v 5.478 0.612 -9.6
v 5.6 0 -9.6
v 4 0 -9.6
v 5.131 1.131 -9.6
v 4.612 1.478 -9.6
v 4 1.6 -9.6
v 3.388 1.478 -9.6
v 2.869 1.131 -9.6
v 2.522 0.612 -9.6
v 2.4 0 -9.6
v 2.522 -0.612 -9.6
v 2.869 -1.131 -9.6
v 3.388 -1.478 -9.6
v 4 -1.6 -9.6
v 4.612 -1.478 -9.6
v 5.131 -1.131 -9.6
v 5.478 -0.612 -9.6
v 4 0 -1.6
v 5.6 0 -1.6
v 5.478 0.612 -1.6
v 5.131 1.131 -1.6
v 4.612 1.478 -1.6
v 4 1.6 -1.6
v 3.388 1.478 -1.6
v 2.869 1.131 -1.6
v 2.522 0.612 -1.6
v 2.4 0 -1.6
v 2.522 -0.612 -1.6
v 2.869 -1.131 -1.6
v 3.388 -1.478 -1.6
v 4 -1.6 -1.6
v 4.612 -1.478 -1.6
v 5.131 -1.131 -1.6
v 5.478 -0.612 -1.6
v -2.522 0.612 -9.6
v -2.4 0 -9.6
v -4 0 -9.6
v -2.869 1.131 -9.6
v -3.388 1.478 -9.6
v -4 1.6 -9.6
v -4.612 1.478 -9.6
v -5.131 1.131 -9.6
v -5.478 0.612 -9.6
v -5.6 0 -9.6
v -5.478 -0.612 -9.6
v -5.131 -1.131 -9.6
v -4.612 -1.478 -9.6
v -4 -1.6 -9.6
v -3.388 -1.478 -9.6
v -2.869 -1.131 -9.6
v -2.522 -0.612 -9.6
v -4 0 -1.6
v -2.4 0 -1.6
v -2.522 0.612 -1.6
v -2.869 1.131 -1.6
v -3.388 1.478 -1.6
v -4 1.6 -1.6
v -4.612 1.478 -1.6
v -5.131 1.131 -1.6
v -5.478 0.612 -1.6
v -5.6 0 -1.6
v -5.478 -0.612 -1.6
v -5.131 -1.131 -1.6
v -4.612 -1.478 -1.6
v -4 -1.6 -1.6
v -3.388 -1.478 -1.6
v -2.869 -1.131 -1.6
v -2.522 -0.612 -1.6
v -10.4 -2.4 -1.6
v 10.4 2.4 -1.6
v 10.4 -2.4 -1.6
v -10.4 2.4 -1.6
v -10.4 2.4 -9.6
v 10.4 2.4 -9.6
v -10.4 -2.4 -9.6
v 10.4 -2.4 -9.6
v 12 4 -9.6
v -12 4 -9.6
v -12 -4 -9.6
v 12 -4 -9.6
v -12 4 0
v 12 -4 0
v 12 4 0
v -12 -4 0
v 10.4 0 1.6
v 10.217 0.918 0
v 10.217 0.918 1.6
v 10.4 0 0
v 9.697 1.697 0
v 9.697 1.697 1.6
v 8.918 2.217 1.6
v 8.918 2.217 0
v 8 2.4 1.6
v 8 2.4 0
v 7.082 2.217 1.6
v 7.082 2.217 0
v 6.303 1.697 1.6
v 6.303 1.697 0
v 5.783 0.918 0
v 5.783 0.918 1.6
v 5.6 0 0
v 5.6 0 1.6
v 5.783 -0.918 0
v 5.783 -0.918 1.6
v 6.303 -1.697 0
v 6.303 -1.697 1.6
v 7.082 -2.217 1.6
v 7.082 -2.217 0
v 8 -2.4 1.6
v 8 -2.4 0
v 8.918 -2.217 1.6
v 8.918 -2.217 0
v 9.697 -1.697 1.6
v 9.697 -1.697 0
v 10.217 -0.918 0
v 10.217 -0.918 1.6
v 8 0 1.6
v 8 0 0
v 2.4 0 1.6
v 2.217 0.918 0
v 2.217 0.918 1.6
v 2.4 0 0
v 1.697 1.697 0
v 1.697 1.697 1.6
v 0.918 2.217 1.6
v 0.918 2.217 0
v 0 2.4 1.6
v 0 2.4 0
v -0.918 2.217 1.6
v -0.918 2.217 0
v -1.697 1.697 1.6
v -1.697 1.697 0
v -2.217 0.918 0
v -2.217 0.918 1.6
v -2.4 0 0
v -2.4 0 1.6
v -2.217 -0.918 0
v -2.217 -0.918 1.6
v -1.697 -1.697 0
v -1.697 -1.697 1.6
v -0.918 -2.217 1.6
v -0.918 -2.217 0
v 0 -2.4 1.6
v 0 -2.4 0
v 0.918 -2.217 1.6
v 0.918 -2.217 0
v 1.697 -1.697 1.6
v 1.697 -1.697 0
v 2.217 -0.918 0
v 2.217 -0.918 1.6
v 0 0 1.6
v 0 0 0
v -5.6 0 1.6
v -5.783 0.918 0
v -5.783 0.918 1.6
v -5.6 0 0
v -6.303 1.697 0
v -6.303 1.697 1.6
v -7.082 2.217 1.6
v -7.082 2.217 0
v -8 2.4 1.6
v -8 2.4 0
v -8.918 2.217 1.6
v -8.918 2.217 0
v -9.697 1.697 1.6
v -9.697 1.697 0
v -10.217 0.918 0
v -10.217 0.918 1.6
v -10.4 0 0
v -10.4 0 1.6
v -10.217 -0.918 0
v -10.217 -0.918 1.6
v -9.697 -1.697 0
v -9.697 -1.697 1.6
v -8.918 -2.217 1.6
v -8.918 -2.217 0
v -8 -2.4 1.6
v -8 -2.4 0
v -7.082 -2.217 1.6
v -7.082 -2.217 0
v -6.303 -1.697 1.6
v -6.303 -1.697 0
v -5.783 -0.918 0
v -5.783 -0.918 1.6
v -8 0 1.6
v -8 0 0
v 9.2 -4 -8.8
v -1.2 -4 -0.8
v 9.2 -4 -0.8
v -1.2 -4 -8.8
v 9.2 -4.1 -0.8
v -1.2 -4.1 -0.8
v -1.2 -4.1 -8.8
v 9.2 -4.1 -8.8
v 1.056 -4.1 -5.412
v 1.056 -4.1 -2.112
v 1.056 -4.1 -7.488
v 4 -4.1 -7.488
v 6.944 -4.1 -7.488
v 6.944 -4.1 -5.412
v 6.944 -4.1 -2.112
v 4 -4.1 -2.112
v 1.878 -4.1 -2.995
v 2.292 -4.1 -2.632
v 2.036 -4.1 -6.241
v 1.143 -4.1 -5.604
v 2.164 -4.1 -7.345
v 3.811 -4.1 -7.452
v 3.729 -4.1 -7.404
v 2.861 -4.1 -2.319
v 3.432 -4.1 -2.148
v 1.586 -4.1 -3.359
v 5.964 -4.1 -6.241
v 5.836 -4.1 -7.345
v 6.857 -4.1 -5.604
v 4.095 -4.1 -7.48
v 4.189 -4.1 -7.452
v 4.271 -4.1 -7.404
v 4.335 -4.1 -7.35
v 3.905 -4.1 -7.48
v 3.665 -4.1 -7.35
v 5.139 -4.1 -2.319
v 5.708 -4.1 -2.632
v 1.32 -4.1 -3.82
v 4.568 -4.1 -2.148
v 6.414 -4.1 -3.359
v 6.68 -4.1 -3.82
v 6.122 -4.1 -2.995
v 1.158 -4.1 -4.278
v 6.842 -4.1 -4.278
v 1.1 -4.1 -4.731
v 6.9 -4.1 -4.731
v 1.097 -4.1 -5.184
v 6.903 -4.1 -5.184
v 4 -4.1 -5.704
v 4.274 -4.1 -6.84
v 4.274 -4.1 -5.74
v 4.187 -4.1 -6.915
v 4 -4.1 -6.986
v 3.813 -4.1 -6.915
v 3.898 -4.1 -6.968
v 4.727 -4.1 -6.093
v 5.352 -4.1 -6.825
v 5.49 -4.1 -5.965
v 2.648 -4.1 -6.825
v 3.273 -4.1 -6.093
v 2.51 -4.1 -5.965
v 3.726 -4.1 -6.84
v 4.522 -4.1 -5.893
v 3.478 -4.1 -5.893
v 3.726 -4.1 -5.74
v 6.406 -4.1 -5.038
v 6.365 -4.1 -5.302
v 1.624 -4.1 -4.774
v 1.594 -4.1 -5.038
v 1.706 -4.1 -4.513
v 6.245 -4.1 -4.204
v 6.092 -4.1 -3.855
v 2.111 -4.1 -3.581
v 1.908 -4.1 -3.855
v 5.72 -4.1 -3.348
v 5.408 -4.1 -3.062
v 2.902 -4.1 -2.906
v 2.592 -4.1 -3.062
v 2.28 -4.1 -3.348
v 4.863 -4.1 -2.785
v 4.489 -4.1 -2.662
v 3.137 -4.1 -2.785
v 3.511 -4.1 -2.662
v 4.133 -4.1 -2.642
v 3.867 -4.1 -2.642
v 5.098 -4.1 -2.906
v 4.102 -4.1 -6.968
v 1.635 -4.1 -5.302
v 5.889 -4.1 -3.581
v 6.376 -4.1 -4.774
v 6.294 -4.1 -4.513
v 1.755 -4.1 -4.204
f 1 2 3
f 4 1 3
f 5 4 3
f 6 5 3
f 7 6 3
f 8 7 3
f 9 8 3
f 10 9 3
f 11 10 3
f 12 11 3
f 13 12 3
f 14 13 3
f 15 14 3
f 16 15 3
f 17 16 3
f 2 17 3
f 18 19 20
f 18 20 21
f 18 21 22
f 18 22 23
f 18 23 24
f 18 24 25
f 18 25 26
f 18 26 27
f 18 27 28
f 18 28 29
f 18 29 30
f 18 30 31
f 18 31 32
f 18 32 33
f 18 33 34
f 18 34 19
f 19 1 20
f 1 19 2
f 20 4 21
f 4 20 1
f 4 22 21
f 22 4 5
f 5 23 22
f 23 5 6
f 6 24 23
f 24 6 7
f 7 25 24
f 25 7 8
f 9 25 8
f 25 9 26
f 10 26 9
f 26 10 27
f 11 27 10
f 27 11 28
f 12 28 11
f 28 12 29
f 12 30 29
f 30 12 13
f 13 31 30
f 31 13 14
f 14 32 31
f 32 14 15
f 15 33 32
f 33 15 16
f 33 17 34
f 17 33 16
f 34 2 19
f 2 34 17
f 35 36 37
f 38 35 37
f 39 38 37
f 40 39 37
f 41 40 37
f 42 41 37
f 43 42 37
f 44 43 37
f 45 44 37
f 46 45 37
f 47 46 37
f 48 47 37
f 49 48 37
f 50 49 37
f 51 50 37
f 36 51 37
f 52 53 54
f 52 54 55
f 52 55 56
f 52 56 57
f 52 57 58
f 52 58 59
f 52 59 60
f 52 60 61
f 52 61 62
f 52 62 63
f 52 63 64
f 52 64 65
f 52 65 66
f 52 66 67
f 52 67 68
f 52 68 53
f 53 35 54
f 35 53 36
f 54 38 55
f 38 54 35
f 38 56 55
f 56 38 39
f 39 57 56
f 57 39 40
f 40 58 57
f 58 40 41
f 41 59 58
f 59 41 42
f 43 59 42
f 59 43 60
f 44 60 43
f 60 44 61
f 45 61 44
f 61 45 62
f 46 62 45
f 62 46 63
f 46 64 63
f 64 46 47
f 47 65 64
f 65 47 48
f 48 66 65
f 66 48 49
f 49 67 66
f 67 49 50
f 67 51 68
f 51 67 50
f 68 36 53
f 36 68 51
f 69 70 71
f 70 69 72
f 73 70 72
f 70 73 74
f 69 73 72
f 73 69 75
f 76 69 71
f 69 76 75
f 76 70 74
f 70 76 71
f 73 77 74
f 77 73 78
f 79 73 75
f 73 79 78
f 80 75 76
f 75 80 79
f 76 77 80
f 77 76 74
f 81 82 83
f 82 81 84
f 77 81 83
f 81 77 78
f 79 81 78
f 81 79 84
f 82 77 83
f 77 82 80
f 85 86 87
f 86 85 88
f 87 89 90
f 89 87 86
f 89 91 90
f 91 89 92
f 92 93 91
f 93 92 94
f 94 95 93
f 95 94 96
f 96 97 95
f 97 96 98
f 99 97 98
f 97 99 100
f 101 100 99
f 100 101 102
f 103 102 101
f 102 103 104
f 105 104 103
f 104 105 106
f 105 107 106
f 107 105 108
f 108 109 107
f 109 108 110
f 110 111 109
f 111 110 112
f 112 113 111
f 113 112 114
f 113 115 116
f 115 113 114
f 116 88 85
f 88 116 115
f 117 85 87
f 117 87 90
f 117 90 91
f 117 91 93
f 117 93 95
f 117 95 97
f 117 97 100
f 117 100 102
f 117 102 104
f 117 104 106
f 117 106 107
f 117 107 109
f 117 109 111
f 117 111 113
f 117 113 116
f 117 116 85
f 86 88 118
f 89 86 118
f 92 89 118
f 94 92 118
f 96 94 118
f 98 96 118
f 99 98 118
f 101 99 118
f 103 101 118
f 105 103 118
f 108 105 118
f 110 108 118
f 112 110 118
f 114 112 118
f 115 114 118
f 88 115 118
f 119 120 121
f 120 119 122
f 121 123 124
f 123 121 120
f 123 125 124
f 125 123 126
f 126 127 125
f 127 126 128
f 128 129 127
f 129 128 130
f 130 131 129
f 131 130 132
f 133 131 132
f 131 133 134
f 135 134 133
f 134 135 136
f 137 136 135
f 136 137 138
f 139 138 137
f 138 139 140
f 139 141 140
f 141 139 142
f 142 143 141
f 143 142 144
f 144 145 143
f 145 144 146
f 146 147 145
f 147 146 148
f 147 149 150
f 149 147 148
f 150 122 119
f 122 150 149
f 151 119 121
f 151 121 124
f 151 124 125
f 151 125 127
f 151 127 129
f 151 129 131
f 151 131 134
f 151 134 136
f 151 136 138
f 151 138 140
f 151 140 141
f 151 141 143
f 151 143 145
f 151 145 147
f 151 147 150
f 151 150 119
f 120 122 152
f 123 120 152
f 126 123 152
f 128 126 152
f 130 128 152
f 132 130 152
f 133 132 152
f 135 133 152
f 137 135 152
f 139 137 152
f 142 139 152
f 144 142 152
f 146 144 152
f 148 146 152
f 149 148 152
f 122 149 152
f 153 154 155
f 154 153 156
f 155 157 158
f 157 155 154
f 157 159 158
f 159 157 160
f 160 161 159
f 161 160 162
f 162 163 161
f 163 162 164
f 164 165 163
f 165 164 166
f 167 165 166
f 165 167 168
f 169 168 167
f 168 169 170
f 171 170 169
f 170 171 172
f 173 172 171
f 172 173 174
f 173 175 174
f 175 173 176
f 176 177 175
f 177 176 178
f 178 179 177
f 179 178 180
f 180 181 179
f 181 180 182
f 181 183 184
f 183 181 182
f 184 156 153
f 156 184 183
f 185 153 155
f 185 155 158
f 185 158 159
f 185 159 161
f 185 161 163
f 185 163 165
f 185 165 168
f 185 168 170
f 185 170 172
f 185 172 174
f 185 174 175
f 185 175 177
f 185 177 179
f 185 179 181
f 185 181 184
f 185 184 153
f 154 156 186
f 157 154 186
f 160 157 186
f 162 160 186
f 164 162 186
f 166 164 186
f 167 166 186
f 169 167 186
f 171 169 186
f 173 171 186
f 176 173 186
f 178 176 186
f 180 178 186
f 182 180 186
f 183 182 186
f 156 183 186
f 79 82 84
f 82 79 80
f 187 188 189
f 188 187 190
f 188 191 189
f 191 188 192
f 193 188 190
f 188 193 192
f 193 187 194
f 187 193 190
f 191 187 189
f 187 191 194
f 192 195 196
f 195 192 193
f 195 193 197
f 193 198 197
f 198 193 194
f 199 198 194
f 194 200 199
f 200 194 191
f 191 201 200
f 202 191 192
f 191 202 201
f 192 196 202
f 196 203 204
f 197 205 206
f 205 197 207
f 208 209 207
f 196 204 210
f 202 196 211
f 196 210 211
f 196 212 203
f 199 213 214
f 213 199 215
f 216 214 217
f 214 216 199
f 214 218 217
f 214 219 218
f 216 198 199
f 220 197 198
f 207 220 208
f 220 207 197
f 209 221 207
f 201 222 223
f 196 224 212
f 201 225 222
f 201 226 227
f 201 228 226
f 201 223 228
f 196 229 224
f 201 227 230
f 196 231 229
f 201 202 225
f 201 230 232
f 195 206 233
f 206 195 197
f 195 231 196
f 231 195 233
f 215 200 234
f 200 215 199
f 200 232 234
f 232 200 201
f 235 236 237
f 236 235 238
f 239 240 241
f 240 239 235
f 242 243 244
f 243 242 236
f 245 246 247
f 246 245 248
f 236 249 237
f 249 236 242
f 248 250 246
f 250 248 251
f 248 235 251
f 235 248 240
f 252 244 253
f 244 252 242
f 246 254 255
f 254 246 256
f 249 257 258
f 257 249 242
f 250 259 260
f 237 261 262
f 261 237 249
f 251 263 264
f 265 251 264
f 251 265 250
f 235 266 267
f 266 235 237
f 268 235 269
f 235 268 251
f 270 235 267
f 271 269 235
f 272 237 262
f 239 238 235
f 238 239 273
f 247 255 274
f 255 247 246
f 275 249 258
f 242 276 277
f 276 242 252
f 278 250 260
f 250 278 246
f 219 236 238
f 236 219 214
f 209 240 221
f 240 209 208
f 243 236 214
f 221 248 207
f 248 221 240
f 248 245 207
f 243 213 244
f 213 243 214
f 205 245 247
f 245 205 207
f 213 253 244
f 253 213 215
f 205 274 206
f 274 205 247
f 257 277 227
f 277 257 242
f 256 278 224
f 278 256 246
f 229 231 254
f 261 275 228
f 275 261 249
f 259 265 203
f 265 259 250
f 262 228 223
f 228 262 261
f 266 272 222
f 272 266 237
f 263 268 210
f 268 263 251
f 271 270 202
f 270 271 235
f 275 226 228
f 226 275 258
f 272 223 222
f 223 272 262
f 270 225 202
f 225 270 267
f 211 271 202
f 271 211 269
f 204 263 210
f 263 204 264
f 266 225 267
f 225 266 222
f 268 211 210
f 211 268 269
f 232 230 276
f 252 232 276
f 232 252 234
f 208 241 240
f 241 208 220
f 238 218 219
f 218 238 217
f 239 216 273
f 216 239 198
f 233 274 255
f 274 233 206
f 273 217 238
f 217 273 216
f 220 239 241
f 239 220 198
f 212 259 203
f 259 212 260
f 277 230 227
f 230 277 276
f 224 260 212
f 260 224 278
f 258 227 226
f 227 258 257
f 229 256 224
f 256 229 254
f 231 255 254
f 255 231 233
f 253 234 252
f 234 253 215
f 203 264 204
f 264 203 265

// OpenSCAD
// file: ../p/4-4edge.scad
use <../lib.scad>
function ldraw_lib__4_4edge() = [
// 0 Circle 1.0
// 0 Name: 4-4edge.dat
// 0 Author: James Jessiman
// 0 !LDRAW_ORG Primitive UPDATE 2017-01
// 0 !LICENSE Licensed under CC BY 2.0 and CC BY 4.0 : see CAreadme.txt
// 
// 0 BFC CERTIFY CCW
  [0,"BFC","CERTIFY"],
  [0,"BFC","CCW"],
// 
// 0 !HISTORY 1998-12-15 [PTadmin] Official Update 1998-10
// 0 !HISTORY 2005-12-28 [PTadmin] Official Update 2005-01
// 0 !HISTORY 2007-06-24 [PTadmin] Header formatted for Contributor Agreement
// 0 !HISTORY 2008-07-01 [PTadmin] Official Update 2008-01
// 0 !HISTORY 2017-01-15 [Steffen] BFCed
// 0 !HISTORY 2017-12-30 [PTadmin] Official Update 2017-01
// 
// 
// 2 24 1 0 0 0.9239 0 0.3827
  [2,24,1,0,0,0.9239,0,0.3827],
// 2 24 0.9239 0 0.3827 0.7071 0 0.7071
  [2,24,0.9239,0,0.3827,0.7071,0,0.7071],
// 2 24 0.7071 0 0.7071 0.3827 0 0.9239
  [2,24,0.7071,0,0.7071,0.3827,0,0.9239],
// 2 24 0.3827 0 0.9239 0 0 1
  [2,24,0.3827,0,0.9239,0,0,1],
// 2 24 0 0 1 -0.3827 0 0.9239
  [2,24,0,0,1,-0.3827,0,0.9239],
// 2 24 -0.3827 0 0.9239 -0.7071 0 0.7071
  [2,24,-0.3827,0,0.9239,-0.7071,0,0.7071],
// 2 24 -0.7071 0 0.7071 -0.9239 0 0.3827
  [2,24,-0.7071,0,0.7071,-0.9239,0,0.3827],
// 2 24 -0.9239 0 0.3827 -1 0 -0
  [2,24,-0.9239,0,0.3827,-1,0,-0],
// 2 24 -1 0 -0 -0.9239 0 -0.3827
  [2,24,-1,0,-0,-0.9239,0,-0.3827],
// 2 24 -0.9239 0 -0.3827 -0.7071 0 -0.7071
  [2,24,-0.9239,0,-0.3827,-0.7071,0,-0.7071],
// 2 24 -0.7071 0 -0.7071 -0.3827 0 -0.9239
  [2,24,-0.7071,0,-0.7071,-0.3827,0,-0.9239],
// 2 24 -0.3827 0 -0.9239 0 0 -1
  [2,24,-0.3827,0,-0.9239,0,0,-1],
// 2 24 0 0 -1 0.3827 0 -0.9239
  [2,24,0,0,-1,0.3827,0,-0.9239],
// 2 24 0.3827 0 -0.9239 0.7071 0 -0.7071
  [2,24,0.3827,0,-0.9239,0.7071,0,-0.7071],
// 2 24 0.7071 0 -0.7071 0.9239 0 -0.3827
  [2,24,0.7071,0,-0.7071,0.9239,0,-0.3827],
// 2 24 0.9239 0 -0.3827 1 0 0
  [2,24,0.9239,0,-0.3827,1,0,0],
];
module ldraw_lib__4_4edge(step=0, col=false, unit=2/5, alt=false, line=0.2, solid=!$preview)
    makepoly(ldraw_lib__4_4edge(), step=step, col=col, unit=unit, alt=alt, line=line, solid=solid);
ldraw_lib__4_4edge(line=0.2);
// file: ../p/4-4disc.scad
use <../lib.scad>
function ldraw_lib__4_4disc() = [
// 0 Disc 1.0
// 0 Name: 4-4disc.dat
// 0 Author: James Jessiman
// 0 !LDRAW_ORG Primitive UPDATE 2002-02
// 0 !LICENSE Licensed under CC BY 2.0 and CC BY 4.0 : see CAreadme.txt
// 
// 0 BFC CERTIFY CCW
  [0,"BFC","CERTIFY"],
  [0,"BFC","CCW"],
// 
// 0 !HISTORY 1998-12-15 [PTadmin] Official Update 1998-10
// 0 !HISTORY 2002-03-23 [sbliss] Added BFC statement
// 0 !HISTORY 2002-04-25 [PTadmin] Official Update 2002-02
// 0 !HISTORY 2007-06-24 [PTadmin] Header formatted for Contributor Agreement
// 0 !HISTORY 2008-07-01 [PTadmin] Official Update 2008-01
// 
// 
// 3 16 0 0 0 1 0 0 0.9239 0 0.3827
  [3,16,0,0,0,1,0,0,0.9239,0,0.3827],
// 3 16 0 0 0 0.9239 0 0.3827 0.7071 0 0.7071
  [3,16,0,0,0,0.9239,0,0.3827,0.7071,0,0.7071],
// 3 16 0 0 0 0.7071 0 0.7071 0.3827 0 0.9239
  [3,16,0,0,0,0.7071,0,0.7071,0.3827,0,0.9239],
// 3 16 0 0 0 0.3827 0 0.9239 0 0 1
  [3,16,0,0,0,0.3827,0,0.9239,0,0,1],
// 3 16 0 0 0 0 0 1 -0.3827 0 0.9239
  [3,16,0,0,0,0,0,1,-0.3827,0,0.9239],
// 3 16 0 0 0 -0.3827 0 0.9239 -0.7071 0 0.7071
  [3,16,0,0,0,-0.3827,0,0.9239,-0.7071,0,0.7071],
// 3 16 0 0 0 -0.7071 0 0.7071 -0.9239 0 0.3827
  [3,16,0,0,0,-0.7071,0,0.7071,-0.9239,0,0.3827],
// 3 16 0 0 0 -0.9239 0 0.3827 -1 0 -0
  [3,16,0,0,0,-0.9239,0,0.3827,-1,0,-0],
// 3 16 0 0 0 -1 0 -0 -0.9239 0 -0.3827
  [3,16,0,0,0,-1,0,-0,-0.9239,0,-0.3827],
// 3 16 0 0 0 -0.9239 0 -0.3827 -0.7071 0 -0.7071
  [3,16,0,0,0,-0.9239,0,-0.3827,-0.7071,0,-0.7071],
// 3 16 0 0 0 -0.7071 0 -0.7071 -0.3827 0 -0.9239
  [3,16,0,0,0,-0.7071,0,-0.7071,-0.3827,0,-0.9239],
// 3 16 0 0 0 -0.3827 0 -0.9239 0 0 -1
  [3,16,0,0,0,-0.3827,0,-0.9239,0,0,-1],
// 3 16 0 0 0 0 0 -1 0.3827 0 -0.9239
  [3,16,0,0,0,0,0,-1,0.3827,0,-0.9239],
// 3 16 0 0 0 0.3827 0 -0.9239 0.7071 0 -0.7071
  [3,16,0,0,0,0.3827,0,-0.9239,0.7071,0,-0.7071],
// 3 16 0 0 0 0.7071 0 -0.7071 0.9239 0 -0.3827
  [3,16,0,0,0,0.7071,0,-0.7071,0.9239,0,-0.3827],
// 3 16 0 0 0 0.9239 0 -0.3827 1 0 0
  [3,16,0,0,0,0.9239,0,-0.3827,1,0,0],
// 0
];
module ldraw_lib__4_4disc(step=0, col=false, unit=2/5, alt=false, line=0.2, solid=!$preview)
    makepoly(ldraw_lib__4_4disc(), step=step, col=col, unit=unit, alt=alt, line=line, solid=solid);
ldraw_lib__4_4disc(line=0.2);
// file: ../p/4-4cyli.scad
use <../lib.scad>
$fa=1; $fs=0.2;
function ldraw_lib__4_4cyli(realsolid=false) = [
// 0 Cylinder 1.0
// 0 Name: 4-4cyli.dat
// 0 Author: James Jessiman
// 0 !LDRAW_ORG Primitive UPDATE 2005-01
// 0 !LICENSE Licensed under CC BY 2.0 and CC BY 4.0 : see CAreadme.txt
// 
// 0 BFC CERTIFY CCW
  [0,"BFC","CERTIFY"],
  [0,"BFC","CCW"],
// 
// 0 !HISTORY 1998-12-15 [PTadmin] Official Update 1998-10
// 0 !HISTORY 2002-03-23 [sbliss] Added BFC statement; merged headers from files in distributions LDraw 0.27 and Complete.
// 0 !HISTORY 2002-04-25 [PTadmin] Official Update 2002-02
// 0 !HISTORY 2004-12-14 [guyvivan] BFC CCW
// 0 !HISTORY 2005-12-28 [PTadmin] Official Update 2005-01
// 0 !HISTORY 2007-06-24 [PTadmin] Header formatted for Contributor Agreement
// 0 !HISTORY 2008-07-01 [PTadmin] Official Update 2008-01
// 
// 
// 4 16 1 1 0 0.9239 1 0.3827 0.9239 0 0.3827 1 0 0
  [4,16,1,1,0,0.9239,1,0.3827,0.9239,0,0.3827,1,0,0],
// 5 24 1 0 0 1 1 0 0.9239 0 0.3827 0.9239 0 -0.3827
  [5,24,1,0,0,1,1,0,0.9239,0,0.3827,0.9239,0,-0.3827],
// 4 16 0.9239 1 0.3827 0.7071 1 0.7071 0.7071 0 0.7071 0.9239 0 0.3827
  [4,16,0.9239,1,0.3827,0.7071,1,0.7071,0.7071,0,0.7071,0.9239,0,0.3827],
// 5 24 0.9239 0 0.3827 0.9239 1 0.3827 0.7071 0 0.7071 1 0 0
  [5,24,0.9239,0,0.3827,0.9239,1,0.3827,0.7071,0,0.7071,1,0,0],
// 4 16 0.7071 1 0.7071 0.3827 1 0.9239 0.3827 0 0.9239 0.7071 0 0.7071
  [4,16,0.7071,1,0.7071,0.3827,1,0.9239,0.3827,0,0.9239,0.7071,0,0.7071],
// 5 24 0.7071 0 0.7071 0.7071 1 0.7071 0.3827 0 0.9239 0.9239 0 0.3827
  [5,24,0.7071,0,0.7071,0.7071,1,0.7071,0.3827,0,0.9239,0.9239,0,0.3827],
// 4 16 0.3827 1 0.9239 0 1 1 0 0 1 0.3827 0 0.9239
  [4,16,0.3827,1,0.9239,0,1,1,0,0,1,0.3827,0,0.9239],
// 5 24 0.3827 0 0.9239 0.3827 1 0.9239 0 0 1 0.7071 0 0.7071
  [5,24,0.3827,0,0.9239,0.3827,1,0.9239,0,0,1,0.7071,0,0.7071],
// 4 16 0 1 1 -0.3827 1 0.9239 -0.3827 0 0.9239 0 0 1
  [4,16,0,1,1,-0.3827,1,0.9239,-0.3827,0,0.9239,0,0,1],
// 5 24 0 0 1 0 1 1 -0.3827 0 0.9239 0.3827 0 0.9239
  [5,24,0,0,1,0,1,1,-0.3827,0,0.9239,0.3827,0,0.9239],
// 4 16 -0.3827 1 0.9239 -0.7071 1 0.7071 -0.7071 0 0.7071 -0.3827 0 0.9239
  [4,16,-0.3827,1,0.9239,-0.7071,1,0.7071,-0.7071,0,0.7071,-0.3827,0,0.9239],
// 5 24 -0.3827 0 0.9239 -0.3827 1 0.9239 -0.7071 0 0.7071 0 0 1
  [5,24,-0.3827,0,0.9239,-0.3827,1,0.9239,-0.7071,0,0.7071,0,0,1],
// 4 16 -0.7071 1 0.7071 -0.9239 1 0.3827 -0.9239 0 0.3827 -0.7071 0 0.7071
  [4,16,-0.7071,1,0.7071,-0.9239,1,0.3827,-0.9239,0,0.3827,-0.7071,0,0.7071],
// 5 24 -0.7071 0 0.7071 -0.7071 1 0.7071 -0.9239 0 0.3827 -0.3827 0 0.9239
  [5,24,-0.7071,0,0.7071,-0.7071,1,0.7071,-0.9239,0,0.3827,-0.3827,0,0.9239],
// 4 16 -0.9239 1 0.3827 -1 1 0 -1 0 0 -0.9239 0 0.3827
  [4,16,-0.9239,1,0.3827,-1,1,0,-1,0,0,-0.9239,0,0.3827],
// 5 24 -0.9239 0 0.3827 -0.9239 1 0.3827 -1 0 0 -0.7071 0 0.7071
  [5,24,-0.9239,0,0.3827,-0.9239,1,0.3827,-1,0,0,-0.7071,0,0.7071],
// 4 16 -1 1 0 -0.9239 1 -0.3827 -0.9239 0 -0.3827 -1 0 0
  [4,16,-1,1,0,-0.9239,1,-0.3827,-0.9239,0,-0.3827,-1,0,0],
// 5 24 -1 0 0 -1 1 0 -0.9239 0 -0.3827 -0.9239 0 0.3827
  [5,24,-1,0,0,-1,1,0,-0.9239,0,-0.3827,-0.9239,0,0.3827],
// 4 16 -0.9239 1 -0.3827 -0.7071 1 -0.7071 -0.7071 0 -0.7071 -0.9239 0 -0.3827
  [4,16,-0.9239,1,-0.3827,-0.7071,1,-0.7071,-0.7071,0,-0.7071,-0.9239,0,-0.3827],
// 5 24 -0.9239 0 -0.3827 -0.9239 1 -0.3827 -0.7071 0 -0.7071 -1 0 0
  [5,24,-0.9239,0,-0.3827,-0.9239,1,-0.3827,-0.7071,0,-0.7071,-1,0,0],
// 4 16 -0.7071 1 -0.7071 -0.3827 1 -0.9239 -0.3827 0 -0.9239 -0.7071 0 -0.7071
  [4,16,-0.7071,1,-0.7071,-0.3827,1,-0.9239,-0.3827,0,-0.9239,-0.7071,0,-0.7071],
// 5 24 -0.7071 0 -0.7071 -0.7071 1 -0.7071 -0.3827 0 -0.9239 -0.9239 0 -0.3827
  [5,24,-0.7071,0,-0.7071,-0.7071,1,-0.7071,-0.3827,0,-0.9239,-0.9239,0,-0.3827],
// 4 16 -0.3827 1 -0.9239 0 1 -1 0 0 -1 -0.3827 0 -0.9239
  [4,16,-0.3827,1,-0.9239,0,1,-1,0,0,-1,-0.3827,0,-0.9239],
// 5 24 -0.3827 0 -0.9239 -0.3827 1 -0.9239 0 0 -1 -0.7071 0 -0.7071
  [5,24,-0.3827,0,-0.9239,-0.3827,1,-0.9239,0,0,-1,-0.7071,0,-0.7071],
// 4 16 0 1 -1 0.3827 1 -0.9239 0.3827 0 -0.9239 0 0 -1
  [4,16,0,1,-1,0.3827,1,-0.9239,0.3827,0,-0.9239,0,0,-1],
// 5 24 0 0 -1 0 1 -1 0.3827 0 -0.9239 -0.3827 0 -0.9239
  [5,24,0,0,-1,0,1,-1,0.3827,0,-0.9239,-0.3827,0,-0.9239],
// 4 16 0.3827 1 -0.9239 0.7071 1 -0.7071 0.7071 0 -0.7071 0.3827 0 -0.9239
  [4,16,0.3827,1,-0.9239,0.7071,1,-0.7071,0.7071,0,-0.7071,0.3827,0,-0.9239],
// 5 24 0.3827 0 -0.9239 0.3827 1 -0.9239 0.7071 0 -0.7071 0 0 -1
  [5,24,0.3827,0,-0.9239,0.3827,1,-0.9239,0.7071,0,-0.7071,0,0,-1],
// 4 16 0.7071 1 -0.7071 0.9239 1 -0.3827 0.9239 0 -0.3827 0.7071 0 -0.7071
  [4,16,0.7071,1,-0.7071,0.9239,1,-0.3827,0.9239,0,-0.3827,0.7071,0,-0.7071],
// 5 24 0.7071 0 -0.7071 0.7071 1 -0.7071 0.9239 0 -0.3827 0.3827 0 -0.9239
  [5,24,0.7071,0,-0.7071,0.7071,1,-0.7071,0.9239,0,-0.3827,0.3827,0,-0.9239],
// 4 16 0.9239 1 -0.3827 1 1 0 1 0 0 0.9239 0 -0.3827
  [4,16,0.9239,1,-0.3827,1,1,0,1,0,0,0.9239,0,-0.3827],
// 5 24 0.9239 0 -0.3827 0.9239 1 -0.3827 1 0 0 0.7071 0 -0.7071
  [5,24,0.9239,0,-0.3827,0.9239,1,-0.3827,1,0,0,0.7071,0,-0.7071],
// 0
];
module ldraw_lib__4_4cyli(step=0, col=false, unit=2/5, alt=false, line=0.2, solid=!$preview)
    makepoly(ldraw_lib__4_4cyli(solid), step=step, col=col, unit=unit, alt=alt, line=line, solid=solid);
ldraw_lib__4_4cyli(line=0.2);
// file: ../p/stud3.scad
use <../lib.scad>
use <4-4cyli.scad>
use <4-4disc.scad>
use <4-4edge.scad>
function ldraw_lib__stud3() = [
// 0 Stud Tube Solid
// 0 Name: stud3.dat
// 0 Author: James Jessiman
// 0 !LDRAW_ORG Primitive UPDATE 2012-01
// 0 !LICENSE Licensed under CC BY 4.0 : see CAreadme.txt
// 
// 0 BFC CERTIFY CCW
  [0,"BFC","CERTIFY"],
  [0,"BFC","CCW"],
// 
// 0 !HISTORY 2002-04-04 [sbliss] Modified for BFC compliance
// 0 !HISTORY 2002-04-25 [PTadmin] Official Update 2002-02
// 0 !HISTORY 2007-06-24 [PTadmin] Header formatted for Contributor Agreement
// 0 !HISTORY 2008-07-01 [PTadmin] Official Update 2008-01
// 0 !HISTORY 2012-02-16 [Philo] Changed to CCW
// 0 !HISTORY 2012-03-30 [PTadmin] Official Update 2012-01
// 
// 
// 1 16 0 -4 0 4 0 0 0 1 0 0 0 4 4-4edge.dat
  [1,16,0,-4,0,4,0,0,0,1,0,0,0,4, ldraw_lib__4_4edge()],
// 1 16 0 0 0 4 0 0 0 1 0 0 0 4 4-4edge.dat
  [1,16,0,0,0,4,0,0,0,1,0,0,0,4, ldraw_lib__4_4edge()],
// 1 16 0 -4 0 4 0 0 0 1 0 0 0 4 4-4disc.dat
  [1,16,0,-4,0,4,0,0,0,1,0,0,0,4, ldraw_lib__4_4disc()],
  [-1,16,0,0,0,4,0,0,0,-1,0,0,0,4, ldraw_lib__4_4disc()],
// 1 16 0 -4 0 4 0 0 0 4 0 0 0 4 4-4cyli.dat
  [1,16,0,-4,0,4,0,0,0,4,0,0,0,4, ldraw_lib__4_4cyli()],
];
module ldraw_lib__stud3(step=0, col=false, unit=2/5, alt=false, line=0.2, solid=!$preview)
    makepoly(ldraw_lib__stud3(), step=step, col=col, unit=unit, alt=alt, line=line, solid=solid);
ldraw_lib__stud3(line=0.2);
// file: ../p/stud.scad
use <../lib.scad>
use <4-4cyli.scad>
use <4-4disc.scad>
use <4-4edge.scad>
function ldraw_lib__stud() = [
// 0 Stud
// 0 Name: stud.dat
// 0 Author: James Jessiman
// 0 !LDRAW_ORG Primitive UPDATE 2012-01
// 0 !LICENSE Licensed under CC BY 4.0 : see CAreadme.txt
// 
// 0 BFC CERTIFY CCW
  [0,"BFC","CERTIFY"],
  [0,"BFC","CCW"],
// 
// 0 !HISTORY 2002-04-04 [sbliss] Modified for BFC compliance
// 0 !HISTORY 2002-04-25 [PTadmin] Official Update 2002-02
// 0 !HISTORY 2007-06-24 [PTadmin] Header formatted for Contributor Agreement
// 0 !HISTORY 2008-07-01 [PTadmin] Official Update 2008-01
// 0 !HISTORY 2012-02-16 [Philo] Changed to CCW
// 0 !HISTORY 2012-03-30 [PTadmin] Official Update 2012-01
// 
// 
// 1 16 0 0 0 6 0 0 0 1 0 0 0 6 4-4edge.dat
  [1,16,0,0,0,6,0,0,0,1,0,0,0,6, ldraw_lib__4_4edge()],
// 1 16 0 -4 0 6 0 0 0 1 0 0 0 6 4-4edge.dat
  [1,16,0,-4,0,6,0,0,0,1,0,0,0,6, ldraw_lib__4_4edge()],
// 1 16 0 0 0 6 0 0 0 -4 0 0 0 6 4-4cyli.dat
  [1,16,0,0,0,6,0,0,0,-4,0,0,0,6, ldraw_lib__4_4cyli()],
// 1 16 0 -4 0 6 0 0 0 1 0 0 0 6 4-4disc.dat
  [1,16,0,-4,0,6,0,0,0,1,0,0,0,6, ldraw_lib__4_4disc()],
  [-1,16,0,0,0,6,0,0,0,-1,0,0,0,6, ldraw_lib__4_4disc()],
];
module ldraw_lib__stud(step=0, col=false, unit=2/5, alt=false, line=0.2, solid=!$preview)
    makepoly(ldraw_lib__stud(), step=step, col=col, unit=unit, alt=alt, line=line, solid=solid);
ldraw_lib__stud(line=0.2);
// file: ../p/box5.scad
use <../lib.scad>
function ldraw_lib__box5() = [
// 0 Box with 5 Faces and All Edges
// 0 Name: box5.dat
// 0 Author: James Jessiman
// 0 !LDRAW_ORG Primitive UPDATE 2012-01
// 0 !LICENSE Licensed under CC BY 2.0 and CC BY 4.0 : see CAreadme.txt
// 
// 0 BFC CERTIFY CCW
  [0,"BFC","CERTIFY"],
  [0,"BFC","CCW"],
// 
// 0 !HISTORY 2002-04-03 [sbliss] Modified for BFC compliance
// 0 !HISTORY 2002-04-25 [PTadmin] Official Update 2002-02
// 0 !HISTORY 2007-06-24 [PTadmin] Header formatted for Contributor Agreement
// 0 !HISTORY 2008-07-01 [PTadmin] Official Update 2008-01
// 0 !HISTORY 2012-02-16 [Philo] Changed to CCW
// 0 !HISTORY 2012-03-30 [PTadmin] Official Update 2012-01
// 
// 
// 2 24 1 1 1 -1 1 1
  [2,24,1,1,1,-1,1,1],
// 2 24 -1 1 1 -1 1 -1
  [2,24,-1,1,1,-1,1,-1],
// 2 24 -1 1 -1 1 1 -1
  [2,24,-1,1,-1,1,1,-1],
// 2 24 1 1 -1 1 1 1
  [2,24,1,1,-1,1,1,1],
// 2 24 1 0 1 -1 0 1
  [2,24,1,0,1,-1,0,1],
// 2 24 -1 0 1 -1 0 -1
  [2,24,-1,0,1,-1,0,-1],
// 2 24 -1 0 -1 1 0 -1
  [2,24,-1,0,-1,1,0,-1],
// 2 24 1 0 -1 1 0 1
  [2,24,1,0,-1,1,0,1],
// 2 24 1 0 1 1 1 1
  [2,24,1,0,1,1,1,1],
// 2 24 -1 0 1 -1 1 1
  [2,24,-1,0,1,-1,1,1],
// 2 24 1 0 -1 1 1 -1
  [2,24,1,0,-1,1,1,-1],
// 2 24 -1 0 -1 -1 1 -1
  [2,24,-1,0,-1,-1,1,-1],
// 4 16 -1 1 1 1 1 1 1 1 -1 -1 1 -1
  [4,16,-1,1,1,1,1,1,1,1,-1,-1,1,-1],
// 4 16 -1 1 1 -1 0 1 1 0 1 1 1 1
  [4,16,-1,1,1,-1,0,1,1,0,1,1,1,1],
// 4 16 -1 1 -1 -1 0 -1 -1 0 1 -1 1 1
  [4,16,-1,1,-1,-1,0,-1,-1,0,1,-1,1,1],
// 4 16 1 1 -1 1 0 -1 -1 0 -1 -1 1 -1
  [4,16,1,1,-1,1,0,-1,-1,0,-1,-1,1,-1],
// 4 16 1 1 1 1 0 1 1 0 -1 1 1 -1
  [4,16,1,1,1,1,0,1,1,0,-1,1,1,-1],
];
makepoly(ldraw_lib__box5(), line=0.2);
// file: ../p/box4t.scad
use <../lib.scad>
function ldraw_lib__box4t() = [
// 0 Box with 4 Adjacent Faces and All Edges
// 0 Name: box4t.dat
// 0 Author: Tore Eriksson [Tore_Eriksson]
// 0 !LDRAW_ORG Primitive UPDATE 2003-02
// 0 !LICENSE Licensed under CC BY 2.0 and CC BY 4.0 : see CAreadme.txt
// 
// 0 BFC CERTIFY CCW
  [0,"BFC","CERTIFY"],
  [0,"BFC","CCW"],
// 
// 0 !HISTORY 1997-09-29 [PTadmin] Official Update 1997-15
// 0 !HISTORY 2002-08-31 [izanette] Modified with WINDZ for BFC compliance
// 0 !HISTORY 2003-08-01 [PTadmin] Official Update 2003-02
// 0 !HISTORY 2007-06-24 [PTadmin] Header formatted for Contributor Agreement
// 0 !HISTORY 2008-07-01 [PTadmin] Official Update 2008-01
// 
// 
// 2 24 1 1 1 -1 1 1
  [2,24,1,1,1,-1,1,1],
// 2 24 -1 1 1 -1 1 -1
  [2,24,-1,1,1,-1,1,-1],
// 2 24 -1 1 -1 1 1 -1
  [2,24,-1,1,-1,1,1,-1],
// 2 24 1 1 -1 1 1 1
  [2,24,1,1,-1,1,1,1],
// 2 24 1 0 1 -1 0 1
  [2,24,1,0,1,-1,0,1],
// 2 24 -1 0 1 -1 0 -1
  [2,24,-1,0,1,-1,0,-1],
// 2 24 -1 0 -1 1 0 -1
  [2,24,-1,0,-1,1,0,-1],
// 2 24 1 0 -1 1 0 1
  [2,24,1,0,-1,1,0,1],
// 2 24 1 0 1 1 1 1
  [2,24,1,0,1,1,1,1],
// 2 24 -1 0 1 -1 1 1
  [2,24,-1,0,1,-1,1,1],
// 2 24 1 0 -1 1 1 -1
  [2,24,1,0,-1,1,1,-1],
// 2 24 -1 0 -1 -1 1 -1
  [2,24,-1,0,-1,-1,1,-1],
// 4 16 1 1 1 1 1 -1 -1 1 -1 -1 1 1
  [4,16,1,1,1,1,1,-1,-1,1,-1,-1,1,1],
// 4 16 1 1 1 -1 1 1 -1 0 1 1 0 1
  [4,16,1,1,1,-1,1,1,-1,0,1,1,0,1],
// 4 16 -1 1 1 -1 1 -1 -1 0 -1 -1 0 1
  [4,16,-1,1,1,-1,1,-1,-1,0,-1,-1,0,1],
// 0 4 16 -1 1 -1 -1 0 -1 1 0 -1 1 1 -1
// 4 16 1 1 -1 1 1 1 1 0 1 1 0 -1
  [4,16,1,1,-1,1,1,1,1,0,1,1,0,-1],
// 0
];
makepoly(ldraw_lib__box4t(), line=0.2);
// file: s/3622s01.scad
use <../../lib.scad>
use <../../p/box4t.scad>
use <../../p/box5.scad>
use <../../p/stud.scad>
use <../../p/stud3.scad>
function ldraw_lib__s__3622s01() = [
// 0 ~Brick  1 x  3 without Front Face
// 0 Name: s\3622s01.dat
// 0 Author: Andy Westrate [westrate]
// 0 !LDRAW_ORG Subpart UPDATE 2004-02
// 0 !LICENSE Licensed under CC BY 2.0 and CC BY 4.0 : see CAreadme.txt
// 
// 0 BFC CERTIFY CCW
  [0,"BFC","CERTIFY"],
  [0,"BFC","CCW"],
// 
// 0 !HISTORY 2003-10-14 [westrate] Subfiled, BFC'd
// 0 !HISTORY 2004-04-22 [PTadmin] Official Update 2004-02
// 0 !HISTORY 2007-08-31 [PTadmin] Header formatted for Contributor Agreement
// 0 !HISTORY 2008-07-01 [PTadmin] Official Update 2008-01
// 
// 
// 0 // Uncomment the following for front face
// 0 // 4 16 30 0 -10 -30 0 -10 -30 24 -10 30 24 -10
// 1 16 10 4 0 1 0 0 0 -5 0 0 0 1 stud3.dat
  [1,16,10,4,0,1,0,0,0,-5,0,0,0,1, ldraw_lib__stud3()],
// 1 16 -10 4 0 1 0 0 0 -5 0 0 0 1 stud3.dat
  [1,16,-10,4,0,1,0,0,0,-5,0,0,0,1, ldraw_lib__stud3()],
// 
// 0 BFC INVERTNEXT
  [0,"BFC","INVERTNEXT"],
// 1 16 0 24 0 26 0 0 0 -20 0 0 0 6 box5.dat
  [1,16,0,24,0,26,0,0,0,-20,0,0,0,6, ldraw_lib__box5()],
// 
// 4 16 30 24 10 26 24 6 -26 24 6 -30 24 10
  [4,16,30,24,10,26,24,6,-26,24,6,-30,24,10],
// 4 16 -30 24 10 -26 24 6 -26 24 -6 -30 24 -10
  [4,16,-30,24,10,-26,24,6,-26,24,-6,-30,24,-10],
// 4 16 -30 24 -10 -26 24 -6 26 24 -6 30 24 -10
  [4,16,-30,24,-10,-26,24,-6,26,24,-6,30,24,-10],
// 4 16 30 24 -10 26 24 -6 26 24 6 30 24 10
  [4,16,30,24,-10,26,24,-6,26,24,6,30,24,10],
// 
// 1 16 0 24 0 30 0 0 0 -24 0 0 0 10 box4t.dat
  [1,16,0,24,0,30,0,0,0,-24,0,0,0,10, ldraw_lib__box4t()],
// 
// 1 16 20 0 0 1 0 0 0 1 0 0 0 1 stud.dat
  [1,16,20,0,0,1,0,0,0,1,0,0,0,1, ldraw_lib__stud()],
// 1 16 0 0 0 1 0 0 0 1 0 0 0 1 stud.dat
  [1,16,0,0,0,1,0,0,0,1,0,0,0,1, ldraw_lib__stud()],
// 1 16 -20 0 0 1 0 0 0 1 0 0 0 1 stud.dat
  [1,16,-20,0,0,1,0,0,0,1,0,0,0,1, ldraw_lib__stud()],
// 0
];
makepoly(ldraw_lib__s__3622s01(), line=0.2);
// file: ../p/logo-shell-1971-outerbox.scad
use <../lib.scad>
function ldraw_lib__logo_shell_1971_outerbox() = [
// 0 Logo Shell 1971 Outerbox
// 0 Name: logo-shell-1971-outerbox.dat
// 0 Author: Vincent Messenet [Cheenzo]
// 0 !LDRAW_ORG Primitive UPDATE 2023-04
// 0 !LICENSE Licensed under CC BY 4.0 : see CAreadme.txt
// 
// 0 BFC CERTIFY CCW
  [0,"BFC","CERTIFY"],
  [0,"BFC","CCW"],
// 
// 0 !HISTORY 2023-06-28 [Cheenzo] Created based on 3004s60 by J. C. Tchang [tchang]
// 0 !HISTORY 2023-08-25 [OrionP] Official Update 2023-04
// 
// 
// 0 // Shell Logo 1971
// 0 // Size: x = -11.5 to 11.5 y = -10.5 to 10.5 z = 0
// 
// 3 16 -11.5 0 10.5 -8.29 0 7.05 -6.67 0 8.47
  [3,16,-11.5,0,10.5,-8.29,0,7.05,-6.67,0,8.47],
// 4 16 -7.17 0 -9.94 -7.67 0 -5.63 -11.16 0 -3.14 -11.5 0 -10.5
  [4,16,-7.17,0,-9.94,-7.67,0,-5.63,-11.16,0,-3.14,-11.5,0,-10.5],
// 3 16 -.74 0 -10.36 -1.06 0 -10.17 -7.17 0 -9.94
  [3,16,-.74,0,-10.36,-1.06,0,-10.17,-7.17,0,-9.94],
// 3 16 -11.5 0 10.5 -6.67 0 8.47 -4.45 0 9.69
  [3,16,-11.5,0,10.5,-6.67,0,8.47,-4.45,0,9.69],
// 3 16 0 0 10.5 -11.5 0 10.5 -2.22 0 10.36
  [3,16,0,0,10.5,-11.5,0,10.5,-2.22,0,10.36],
// 3 16 -11.5 0 10.5 -4.45 0 9.69 -2.22 0 10.36
  [3,16,-11.5,0,10.5,-4.45,0,9.69,-2.22,0,10.36],
// 3 16 -11.5 0 10.5 -9.43 0 5.63 -8.29 0 7.05
  [3,16,-11.5,0,10.5,-9.43,0,5.63,-8.29,0,7.05],
// 4 16 11.16 0 -3.14 7.67 0 -5.63 7.17 0 -9.94 11.5 0 -10.5
  [4,16,11.16,0,-3.14,7.67,0,-5.63,7.17,0,-9.94,11.5,0,-10.5],
// 4 16 11.5 0 -10.5 7.17 0 -9.94 .74 0 -10.36 .37 0 -10.47
  [4,16,11.5,0,-10.5,7.17,0,-9.94,.74,0,-10.36,.37,0,-10.47],
// 3 16 7.17 0 -9.94 1.06 0 -10.17 .74 0 -10.36
  [3,16,7.17,0,-9.94,1.06,0,-10.17,.74,0,-10.36],
// 3 16 7.17 0 -9.94 1.31 0 -9.96 1.06 0 -10.17
  [3,16,7.17,0,-9.94,1.31,0,-9.96,1.06,0,-10.17],
// 3 16 .37 0 -10.47 0 0 -10.5 11.5 0 -10.5
  [3,16,.37,0,-10.47,0,0,-10.5,11.5,0,-10.5],
// 3 16 -.37 0 -10.47 -11.5 0 -10.5 0 0 -10.5
  [3,16,-.37,0,-10.47,-11.5,0,-10.5,0,0,-10.5],
// 4 16 -.37 0 -10.47 -.74 0 -10.36 -7.17 0 -9.94 -11.5 0 -10.5
  [4,16,-.37,0,-10.47,-.74,0,-10.36,-7.17,0,-9.94,-11.5,0,-10.5],
// 3 16 -1.06 0 -10.17 -1.31 0 -9.96 -7.17 0 -9.94
  [3,16,-1.06,0,-10.17,-1.31,0,-9.96,-7.17,0,-9.94],
// 3 16 11.5 0 10.5 4.45 0 9.69 6.67 0 8.47
  [3,16,11.5,0,10.5,4.45,0,9.69,6.67,0,8.47],
// 3 16 -11.5 0 10.5 -10.47 0 3.83 -9.43 0 5.63
  [3,16,-11.5,0,10.5,-10.47,0,3.83,-9.43,0,5.63],
// 3 16 11.5 0 10.5 2.22 0 10.36 4.45 0 9.69
  [3,16,11.5,0,10.5,2.22,0,10.36,4.45,0,9.69],
// 3 16 11.5 0 10.5 9.43 0 5.63 10.47 0 3.83
  [3,16,11.5,0,10.5,9.43,0,5.63,10.47,0,3.83],
// 3 16 11.5 0 10.5 8.29 0 7.05 9.43 0 5.63
  [3,16,11.5,0,10.5,8.29,0,7.05,9.43,0,5.63],
// 3 16 11.5 0 10.5 6.67 0 8.47 8.29 0 7.05
  [3,16,11.5,0,10.5,6.67,0,8.47,8.29,0,7.05],
// 3 16 -11.5 0 10.5 -11.1 0 2.04 -10.47 0 3.83
  [3,16,-11.5,0,10.5,-11.1,0,2.04,-10.47,0,3.83],
// 3 16 11.5 0 10.5 10.47 0 3.83 11.1 0 2.04
  [3,16,11.5,0,10.5,10.47,0,3.83,11.1,0,2.04],
// 3 16 -11.5 0 10.5 -11.33 0 .27 -11.1 0 2.04
  [3,16,-11.5,0,10.5,-11.33,0,.27,-11.1,0,2.04],
// 3 16 11.5 0 10.5 0 0 10.5 2.22 0 10.36
  [3,16,11.5,0,10.5,0,0,10.5,2.22,0,10.36],
// 3 16 11.5 0 10.5 11.1 0 2.04 11.33 0 .27
  [3,16,11.5,0,10.5,11.1,0,2.04,11.33,0,.27],
// 4 16 -11.16 0 -3.14 -11.34 0 -1.5 -11.5 0 -2.39 -11.5 0 -10.5
  [4,16,-11.16,0,-3.14,-11.34,0,-1.5,-11.5,0,-2.39,-11.5,0,-10.5],
// 4 16 -11.34 0 -1.5 -11.33 0 .27 -11.5 0 10.5 -11.5 0 -2.39
  [4,16,-11.34,0,-1.5,-11.33,0,.27,-11.5,0,10.5,-11.5,0,-2.39],
// 4 16 11.5 0 -2.39 11.34 0 -1.5 11.16 0 -3.14 11.5 0 -10.5
  [4,16,11.5,0,-2.39,11.34,0,-1.5,11.16,0,-3.14,11.5,0,-10.5],
// 4 16 11.5 0 -2.39 11.5 0 10.5 11.33 0 .27 11.34 0 -1.5
  [4,16,11.5,0,-2.39,11.5,0,10.5,11.33,0,.27,11.34,0,-1.5],
];
module ldraw_lib__logo_shell_1971_outerbox(step=0, col=false, unit=2/5, alt=false, line=0.2, solid=!$preview)
    makepoly(ldraw_lib__logo_shell_1971_outerbox(), step=step, col=col, unit=unit, alt=alt, line=line, solid=solid);
ldraw_lib__logo_shell_1971_outerbox(line=0.2);
// file: ../p/box5-12.scad
use <../lib.scad>
function ldraw_lib__box5_12() = [
// 0 Box with 5 Faces without Any Edges
// 0 Name: box5-12.dat
// 0 Author: Chris Dee [cwdee]
// 0 !LDRAW_ORG Primitive UPDATE 2009-02
// 0 !LICENSE Licensed under CC BY 2.0 and CC BY 4.0 : see CAreadme.txt
// 
// 0 BFC CERTIFY CCW
  [0,"BFC","CERTIFY"],
  [0,"BFC","CCW"],
// 
// 0 !HISTORY 2009-09-03 [PTadmin] Official Update 2009-02
// 
// 
// 4 16 1 1 1 1 1 -1 -1 1 -1 -1 1 1
  [4,16,1,1,1,1,1,-1,-1,1,-1,-1,1,1],
// 4 16 -1 0 1 1 0 1 1 1 1 -1 1 1
  [4,16,-1,0,1,1,0,1,1,1,1,-1,1,1],
// 4 16 -1 0 -1 -1 0 1 -1 1 1 -1 1 -1
  [4,16,-1,0,-1,-1,0,1,-1,1,1,-1,1,-1],
// 4 16 1 0 -1 -1 0 -1 -1 1 -1 1 1 -1
  [4,16,1,0,-1,-1,0,-1,-1,1,-1,1,1,-1],
// 4 16 1 0 1 1 0 -1 1 1 -1 1 1 1
  [4,16,1,0,1,1,0,-1,1,1,-1,1,1,1],
// 0
];
module ldraw_lib__box5_12(step=0, col=false, unit=2/5, alt=false, line=0.2, solid=!$preview)
    makepoly(ldraw_lib__box5_12(), step=step, col=col, unit=unit, alt=alt, line=line, solid=solid);
ldraw_lib__box5_12(line=0.2);
// file: 3622.scad
use <../lib.scad>
use <s/3622s01.scad>
function ldraw_lib__3622() = [
// 0 Brick  1 x  3
// 0 Name: 3622.dat
// 0 Author: James Jessiman
// 0 !LDRAW_ORG Part UPDATE 2004-02
// 0 !LICENSE Licensed under CC BY 2.0 and CC BY 4.0 : see CAreadme.txt
// 
// 0 BFC CERTIFY CCW
  [0,"BFC","CERTIFY"],
  [0,"BFC","CCW"],
// 
// 0 !HISTORY 2003-10-15 [westrate] Subfiled, BFC'd
// 0 !HISTORY 2004-04-22 [PTadmin] Official Update 2004-02
// 0 !HISTORY 2007-06-25 [PTadmin] Header formatted for Contributor Agreement
// 0 !HISTORY 2008-07-01 [PTadmin] Official Update 2008-01
// 
// 
// 1 16 0 0 0 1 0 0 0 1 0 0 0 1 s\3622s01.dat
  [1,16,0,0,0,1,0,0,0,1,0,0,0,1, ldraw_lib__s__3622s01()],
// 4 16 30 0 -10 -30 0 -10 -30 24 -10 30 24 -10
  [4,16,30,0,-10,-30,0,-10,-30,24,-10,30,24,-10],
// 0
];
makepoly(ldraw_lib__3622(), line=0.2);
// file: 195555b.scad
use <../lib.scad>
use <../p/box5-12.scad>
use <../p/logo-shell-1971-outerbox.scad>
use <../p/logo-shell-1971.scad>
function ldraw_lib__195555b() = [
// 0 Sticker  1.0 x  1.3 with Shell Logo 1971 on White Background
// 0 Name: 195555b.dat
// 0 Author: Takeshi Takahashi [RainbowDolphin]
// 0 !LDRAW_ORG Part UPDATE 2026-01
// 0 !LICENSE Licensed under CC BY 4.0 : see CAreadme.txt
// 
// 0 BFC CERTIFY CCW
  [0,"BFC","CERTIFY"],
  [0,"BFC","CCW"],
// 
// 0 !KEYWORDS Bricklink 6371stk01, Brickowl 584391, Rebrickable 195555
// 0 !KEYWORDS Service station, Set 6371
// 
// 0 !HISTORY 2023-06-29 [RainbowDolphin] Colour variant of 196945x by Vincent Messenet [Cheenzo]
// 0 !HISTORY 2023-08-25 [OrionP] Official Update 2023-04
// 0 !HISTORY 2026-01-23 [MagFors] Update description
// 0 !HISTORY 2026-01-29 [OrionP] Official Update 2026-01
// 
// 1 16 0 -.25 0 13 0 0 0 .25 0 0 0 10 box5-12.dat
  [1,16,0,-.25,0,13,0,0,0,.25,0,0,0,10, ldraw_lib__box5_12()],
// 4 15 -7.36 -.25 -1.5296 -7.36 -.25 6.72 -13 -.25 10 -13 -.25 -10
  [4,15,-7.36,-.25,-1.5296,-7.36,-.25,6.72,-13,-.25,10,-13,-.25,-10],
// 3 15 -7.36 -.25 -1.5296 -13 -.25 -10 -7.36 -.25 -6.72
  [3,15,-7.36,-.25,-1.5296,-13,-.25,-10,-7.36,-.25,-6.72],
// 4 15 0 -.25 -6.72 -7.36 -.25 -6.72 -13 -.25 -10 13 -.25 -10
  [4,15,0,-.25,-6.72,-7.36,-.25,-6.72,-13,-.25,-10,13,-.25,-10],
// 3 15 7.36 -.25 -6.72 0 -.25 -6.72 13 -.25 -10
  [3,15,7.36,-.25,-6.72,0,-.25,-6.72,13,-.25,-10],
// 4 15 7.36 -.25 -1.5296 7.36 -.25 -6.72 13 -.25 -10 13 -.25 10
  [4,15,7.36,-.25,-1.5296,7.36,-.25,-6.72,13,-.25,-10,13,-.25,10],
// 3 15 13 -.25 10 7.36 -.25 6.72 7.36 -.25 -1.5296
  [3,15,13,-.25,10,7.36,-.25,6.72,7.36,-.25,-1.5296],
// 4 15 0 -.25 6.72 7.36 -.25 6.72 13 -.25 10 -13 -.25 10
  [4,15,0,-.25,6.72,7.36,-.25,6.72,13,-.25,10,-13,-.25,10],
// 3 15 -13 -.25 10 -7.36 -.25 6.72 0 -.25 6.72
  [3,15,-13,-.25,10,-7.36,-.25,6.72,0,-.25,6.72],
// 1 15 0 -.25 0 .64 0 0 0 1 0 0 0 .64 logo-shell-1971-outerbox.dat
  [1,15,0,-.25,0,.64,0,0,0,1,0,0,0,.64, ldraw_lib__logo_shell_1971_outerbox()],
// 1 16 0 -.25 0 .64 0 0 0 1 0 0 0 .64 logo-shell-1971.dat
  [1,16,0,-.25,0,.64,0,0,0,1,0,0,0,.64, ldraw_lib__logo_shell_1971()],
];
module ldraw_lib__195555b(step=0, col=false, unit=2/5, alt=false, line=0.2, solid=!$preview)
    makepoly(ldraw_lib__195555b(), step=step, col=col, unit=unit, alt=alt, line=line, solid=solid);
ldraw_lib__195555b(line=0.2);
// main file
use <../lib.scad>
use <195555b.scad>
use <3622.scad>
function ldraw_lib__3622d02() = [
// 0 Brick  1 x  3 with Shell Logo 1971 Right Sticker
// 0 Name: 3622d02.dat
// 0 Author: Takeshi Takahashi [RainbowDolphin]
// 0 !LDRAW_ORG Shortcut UPDATE 2024-07
// 0 !LICENSE Licensed under CC BY 4.0 : see CAreadme.txt
// 
// 0 BFC CERTIFY CCW
  [0,"BFC","CERTIFY"],
  [0,"BFC","CCW"],
// 
// 0 !CATEGORY Sticker Shortcut
// 0 !KEYWORDS Bricklink 3622pb044R, Service station, Set 6371, Tow Truck
// 
// 0 !HISTORY 2024-08-26 [OrionP] Official Update 2024-07
// 
// 1 16 0 0 0 1 0 0 0 1 0 0 0 1 3622.dat
  [1,16,0,0,0,1,0,0,0,1,0,0,0,1, ldraw_lib__3622()],
// 1 16 10 12 -10 1 0 0 0 0 -1 0 1 0 195555b.dat
  [1,16,10,12,-10,1,0,0,0,0,-1,0,1,0, ldraw_lib__195555b()],
];
module ldraw_lib__3622d02(step=0, col=false, unit=2/5, alt=false, line=0.2, solid=!$preview)
    makepoly(ldraw_lib__3622d02(), step=step, col=col, unit=unit, alt=alt, line=line, solid=solid);
ldraw_lib__3622d02(line=0.2);
